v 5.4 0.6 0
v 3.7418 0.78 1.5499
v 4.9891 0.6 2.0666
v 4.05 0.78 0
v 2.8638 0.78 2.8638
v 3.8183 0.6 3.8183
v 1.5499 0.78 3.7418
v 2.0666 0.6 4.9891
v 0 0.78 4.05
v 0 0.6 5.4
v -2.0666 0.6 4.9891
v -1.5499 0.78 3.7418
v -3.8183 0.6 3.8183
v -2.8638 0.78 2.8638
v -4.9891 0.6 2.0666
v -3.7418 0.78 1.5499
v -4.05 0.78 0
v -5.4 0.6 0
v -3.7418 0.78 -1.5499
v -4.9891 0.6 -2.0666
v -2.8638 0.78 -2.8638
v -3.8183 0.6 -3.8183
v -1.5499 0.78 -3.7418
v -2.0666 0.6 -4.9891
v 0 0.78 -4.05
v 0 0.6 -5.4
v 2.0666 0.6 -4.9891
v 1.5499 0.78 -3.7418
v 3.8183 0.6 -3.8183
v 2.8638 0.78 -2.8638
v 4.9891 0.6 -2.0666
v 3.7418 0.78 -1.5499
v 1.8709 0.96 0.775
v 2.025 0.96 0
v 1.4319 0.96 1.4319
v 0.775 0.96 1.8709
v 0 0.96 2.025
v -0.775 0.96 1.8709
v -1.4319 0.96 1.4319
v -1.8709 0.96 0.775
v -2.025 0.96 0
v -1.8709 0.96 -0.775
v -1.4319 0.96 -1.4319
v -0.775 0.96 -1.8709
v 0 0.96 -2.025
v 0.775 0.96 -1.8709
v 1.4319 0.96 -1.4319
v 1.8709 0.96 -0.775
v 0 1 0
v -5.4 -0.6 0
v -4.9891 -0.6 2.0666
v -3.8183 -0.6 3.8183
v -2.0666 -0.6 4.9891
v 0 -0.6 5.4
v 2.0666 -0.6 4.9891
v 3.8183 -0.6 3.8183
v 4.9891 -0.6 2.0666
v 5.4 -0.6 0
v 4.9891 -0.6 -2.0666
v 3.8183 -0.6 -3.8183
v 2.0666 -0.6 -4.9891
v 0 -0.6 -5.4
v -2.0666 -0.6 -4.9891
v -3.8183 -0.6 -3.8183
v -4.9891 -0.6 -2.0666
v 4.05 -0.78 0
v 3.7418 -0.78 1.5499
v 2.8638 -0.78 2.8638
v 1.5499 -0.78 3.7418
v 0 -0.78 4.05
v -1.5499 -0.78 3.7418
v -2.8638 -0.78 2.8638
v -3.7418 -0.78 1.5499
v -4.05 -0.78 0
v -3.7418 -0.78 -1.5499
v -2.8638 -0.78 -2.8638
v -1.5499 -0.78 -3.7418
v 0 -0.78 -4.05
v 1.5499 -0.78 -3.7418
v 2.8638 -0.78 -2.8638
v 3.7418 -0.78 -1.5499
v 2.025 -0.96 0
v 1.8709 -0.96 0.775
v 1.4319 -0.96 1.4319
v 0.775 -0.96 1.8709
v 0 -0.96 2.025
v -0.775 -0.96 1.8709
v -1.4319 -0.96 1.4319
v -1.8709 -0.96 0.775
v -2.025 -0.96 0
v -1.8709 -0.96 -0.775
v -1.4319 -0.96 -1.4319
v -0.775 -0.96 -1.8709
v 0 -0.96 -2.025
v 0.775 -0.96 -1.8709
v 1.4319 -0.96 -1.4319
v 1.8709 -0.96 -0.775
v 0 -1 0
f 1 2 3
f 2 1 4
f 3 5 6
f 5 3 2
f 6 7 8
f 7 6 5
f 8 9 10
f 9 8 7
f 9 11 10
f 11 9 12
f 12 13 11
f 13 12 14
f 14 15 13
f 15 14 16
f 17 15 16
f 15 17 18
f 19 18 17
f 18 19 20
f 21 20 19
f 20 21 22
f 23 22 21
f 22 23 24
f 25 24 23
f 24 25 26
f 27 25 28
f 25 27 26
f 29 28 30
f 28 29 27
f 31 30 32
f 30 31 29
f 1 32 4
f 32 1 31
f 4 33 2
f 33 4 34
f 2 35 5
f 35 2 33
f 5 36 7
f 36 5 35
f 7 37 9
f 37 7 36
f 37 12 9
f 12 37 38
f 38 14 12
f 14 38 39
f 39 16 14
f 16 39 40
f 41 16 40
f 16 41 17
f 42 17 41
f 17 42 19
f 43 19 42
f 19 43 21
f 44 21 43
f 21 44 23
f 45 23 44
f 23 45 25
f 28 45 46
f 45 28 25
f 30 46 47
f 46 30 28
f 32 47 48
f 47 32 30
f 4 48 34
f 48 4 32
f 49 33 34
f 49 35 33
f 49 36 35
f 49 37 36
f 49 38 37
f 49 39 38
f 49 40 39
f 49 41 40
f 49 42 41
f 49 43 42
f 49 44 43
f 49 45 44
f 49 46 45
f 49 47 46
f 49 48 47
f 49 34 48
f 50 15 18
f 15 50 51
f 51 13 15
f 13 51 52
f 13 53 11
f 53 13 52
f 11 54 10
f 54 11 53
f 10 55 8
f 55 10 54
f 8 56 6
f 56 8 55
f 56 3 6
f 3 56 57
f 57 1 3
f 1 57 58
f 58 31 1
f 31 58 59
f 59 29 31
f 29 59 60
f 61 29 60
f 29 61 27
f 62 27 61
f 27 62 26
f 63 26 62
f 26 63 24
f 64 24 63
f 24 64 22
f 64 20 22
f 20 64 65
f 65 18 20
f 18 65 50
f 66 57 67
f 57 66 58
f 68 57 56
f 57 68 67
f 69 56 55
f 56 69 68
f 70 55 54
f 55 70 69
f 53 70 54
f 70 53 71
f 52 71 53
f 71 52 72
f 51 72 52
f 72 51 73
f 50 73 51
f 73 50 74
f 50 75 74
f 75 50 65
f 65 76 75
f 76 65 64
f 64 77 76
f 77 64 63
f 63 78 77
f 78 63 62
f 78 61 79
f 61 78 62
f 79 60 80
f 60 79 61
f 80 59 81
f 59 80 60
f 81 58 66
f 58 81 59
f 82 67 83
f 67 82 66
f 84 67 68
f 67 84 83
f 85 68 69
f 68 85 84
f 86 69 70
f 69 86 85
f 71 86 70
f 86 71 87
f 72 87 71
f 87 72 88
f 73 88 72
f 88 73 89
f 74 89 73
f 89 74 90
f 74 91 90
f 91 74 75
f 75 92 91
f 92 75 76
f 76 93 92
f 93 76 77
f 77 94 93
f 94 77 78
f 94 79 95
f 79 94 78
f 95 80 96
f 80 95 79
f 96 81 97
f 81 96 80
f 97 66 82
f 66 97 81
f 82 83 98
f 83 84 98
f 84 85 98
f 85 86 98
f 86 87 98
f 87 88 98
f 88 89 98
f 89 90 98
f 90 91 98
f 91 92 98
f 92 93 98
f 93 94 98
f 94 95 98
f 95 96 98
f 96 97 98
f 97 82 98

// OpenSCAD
// file: ../../p/4-4cyli.scad
use <../lib.scad>
function ldraw_lib__4_4cyli() = [
// 0 Cylinder 1.0
// 0 Name: 4-4cyli.dat
// 0 Author: James Jessiman
// 0 !LDRAW_ORG Primitive UPDATE 2005-01
// 0 !LICENSE Licensed under CC BY 2.0 and CC BY 4.0 : see CAreadme.txt
// 
// 0 BFC CERTIFY CCW
  [0,"BFC","CERTIFY"],
  [0,"BFC","CCW"],
// 
// 0 !HISTORY 1998-12-15 [PTadmin] Official Update 1998-10
// 0 !HISTORY 2002-03-23 [sbliss] Added BFC statement; merged headers from files in distributions LDraw 0.27 and Complete.
// 0 !HISTORY 2002-04-25 [PTadmin] Official Update 2002-02
// 0 !HISTORY 2004-12-14 [guyvivan] BFC CCW
// 0 !HISTORY 2005-12-28 [PTadmin] Official Update 2005-01
// 0 !HISTORY 2007-06-24 [PTadmin] Header formatted for Contributor Agreement
// 0 !HISTORY 2008-07-01 [PTadmin] Official Update 2008-01
// 
// 
// 4 16 1 1 0 0.9239 1 0.3827 0.9239 0 0.3827 1 0 0
  [4,16,1,1,0,0.9239,1,0.3827,0.9239,0,0.3827,1,0,0],
// 5 24 1 0 0 1 1 0 0.9239 0 0.3827 0.9239 0 -0.3827
  [5,24,1,0,0,1,1,0,0.9239,0,0.3827,0.9239,0,-0.3827],
// 4 16 0.9239 1 0.3827 0.7071 1 0.7071 0.7071 0 0.7071 0.9239 0 0.3827
  [4,16,0.9239,1,0.3827,0.7071,1,0.7071,0.7071,0,0.7071,0.9239,0,0.3827],
// 5 24 0.9239 0 0.3827 0.9239 1 0.3827 0.7071 0 0.7071 1 0 0
  [5,24,0.9239,0,0.3827,0.9239,1,0.3827,0.7071,0,0.7071,1,0,0],
// 4 16 0.7071 1 0.7071 0.3827 1 0.9239 0.3827 0 0.9239 0.7071 0 0.7071
  [4,16,0.7071,1,0.7071,0.3827,1,0.9239,0.3827,0,0.9239,0.7071,0,0.7071],
// 5 24 0.7071 0 0.7071 0.7071 1 0.7071 0.3827 0 0.9239 0.9239 0 0.3827
  [5,24,0.7071,0,0.7071,0.7071,1,0.7071,0.3827,0,0.9239,0.9239,0,0.3827],
// 4 16 0.3827 1 0.9239 0 1 1 0 0 1 0.3827 0 0.9239
  [4,16,0.3827,1,0.9239,0,1,1,0,0,1,0.3827,0,0.9239],
// 5 24 0.3827 0 0.9239 0.3827 1 0.9239 0 0 1 0.7071 0 0.7071
  [5,24,0.3827,0,0.9239,0.3827,1,0.9239,0,0,1,0.7071,0,0.7071],
// 4 16 0 1 1 -0.3827 1 0.9239 -0.3827 0 0.9239 0 0 1
  [4,16,0,1,1,-0.3827,1,0.9239,-0.3827,0,0.9239,0,0,1],
// 5 24 0 0 1 0 1 1 -0.3827 0 0.9239 0.3827 0 0.9239
  [5,24,0,0,1,0,1,1,-0.3827,0,0.9239,0.3827,0,0.9239],
// 4 16 -0.3827 1 0.9239 -0.7071 1 0.7071 -0.7071 0 0.7071 -0.3827 0 0.9239
  [4,16,-0.3827,1,0.9239,-0.7071,1,0.7071,-0.7071,0,0.7071,-0.3827,0,0.9239],
// 5 24 -0.3827 0 0.9239 -0.3827 1 0.9239 -0.7071 0 0.7071 0 0 1
  [5,24,-0.3827,0,0.9239,-0.3827,1,0.9239,-0.7071,0,0.7071,0,0,1],
// 4 16 -0.7071 1 0.7071 -0.9239 1 0.3827 -0.9239 0 0.3827 -0.7071 0 0.7071
  [4,16,-0.7071,1,0.7071,-0.9239,1,0.3827,-0.9239,0,0.3827,-0.7071,0,0.7071],
// 5 24 -0.7071 0 0.7071 -0.7071 1 0.7071 -0.9239 0 0.3827 -0.3827 0 0.9239
  [5,24,-0.7071,0,0.7071,-0.7071,1,0.7071,-0.9239,0,0.3827,-0.3827,0,0.9239],
// 4 16 -0.9239 1 0.3827 -1 1 0 -1 0 0 -0.9239 0 0.3827
  [4,16,-0.9239,1,0.3827,-1,1,0,-1,0,0,-0.9239,0,0.3827],
// 5 24 -0.9239 0 0.3827 -0.9239 1 0.3827 -1 0 0 -0.7071 0 0.7071
  [5,24,-0.9239,0,0.3827,-0.9239,1,0.3827,-1,0,0,-0.7071,0,0.7071],
// 4 16 -1 1 0 -0.9239 1 -0.3827 -0.9239 0 -0.3827 -1 0 0
  [4,16,-1,1,0,-0.9239,1,-0.3827,-0.9239,0,-0.3827,-1,0,0],
// 5 24 -1 0 0 -1 1 0 -0.9239 0 -0.3827 -0.9239 0 0.3827
  [5,24,-1,0,0,-1,1,0,-0.9239,0,-0.3827,-0.9239,0,0.3827],
// 4 16 -0.9239 1 -0.3827 -0.7071 1 -0.7071 -0.7071 0 -0.7071 -0.9239 0 -0.3827
  [4,16,-0.9239,1,-0.3827,-0.7071,1,-0.7071,-0.7071,0,-0.7071,-0.9239,0,-0.3827],
// 5 24 -0.9239 0 -0.3827 -0.9239 1 -0.3827 -0.7071 0 -0.7071 -1 0 0
  [5,24,-0.9239,0,-0.3827,-0.9239,1,-0.3827,-0.7071,0,-0.7071,-1,0,0],
// 4 16 -0.7071 1 -0.7071 -0.3827 1 -0.9239 -0.3827 0 -0.9239 -0.7071 0 -0.7071
  [4,16,-0.7071,1,-0.7071,-0.3827,1,-0.9239,-0.3827,0,-0.9239,-0.7071,0,-0.7071],
// 5 24 -0.7071 0 -0.7071 -0.7071 1 -0.7071 -0.3827 0 -0.9239 -0.9239 0 -0.3827
  [5,24,-0.7071,0,-0.7071,-0.7071,1,-0.7071,-0.3827,0,-0.9239,-0.9239,0,-0.3827],
// 4 16 -0.3827 1 -0.9239 0 1 -1 0 0 -1 -0.3827 0 -0.9239
  [4,16,-0.3827,1,-0.9239,0,1,-1,0,0,-1,-0.3827,0,-0.9239],
// 5 24 -0.3827 0 -0.9239 -0.3827 1 -0.9239 0 0 -1 -0.7071 0 -0.7071
  [5,24,-0.3827,0,-0.9239,-0.3827,1,-0.9239,0,0,-1,-0.7071,0,-0.7071],
// 4 16 0 1 -1 0.3827 1 -0.9239 0.3827 0 -0.9239 0 0 -1
  [4,16,0,1,-1,0.3827,1,-0.9239,0.3827,0,-0.9239,0,0,-1],
// 5 24 0 0 -1 0 1 -1 0.3827 0 -0.9239 -0.3827 0 -0.9239
  [5,24,0,0,-1,0,1,-1,0.3827,0,-0.9239,-0.3827,0,-0.9239],
// 4 16 0.3827 1 -0.9239 0.7071 1 -0.7071 0.7071 0 -0.7071 0.3827 0 -0.9239
  [4,16,0.3827,1,-0.9239,0.7071,1,-0.7071,0.7071,0,-0.7071,0.3827,0,-0.9239],
// 5 24 0.3827 0 -0.9239 0.3827 1 -0.9239 0.7071 0 -0.7071 0 0 -1
  [5,24,0.3827,0,-0.9239,0.3827,1,-0.9239,0.7071,0,-0.7071,0,0,-1],
// 4 16 0.7071 1 -0.7071 0.9239 1 -0.3827 0.9239 0 -0.3827 0.7071 0 -0.7071
  [4,16,0.7071,1,-0.7071,0.9239,1,-0.3827,0.9239,0,-0.3827,0.7071,0,-0.7071],
// 5 24 0.7071 0 -0.7071 0.7071 1 -0.7071 0.9239 0 -0.3827 0.3827 0 -0.9239
  [5,24,0.7071,0,-0.7071,0.7071,1,-0.7071,0.9239,0,-0.3827,0.3827,0,-0.9239],
// 4 16 0.9239 1 -0.3827 1 1 0 1 0 0 0.9239 0 -0.3827
  [4,16,0.9239,1,-0.3827,1,1,0,1,0,0,0.9239,0,-0.3827],
// 5 24 0.9239 0 -0.3827 0.9239 1 -0.3827 1 0 0 0.7071 0 -0.7071
  [5,24,0.9239,0,-0.3827,0.9239,1,-0.3827,1,0,0,0.7071,0,-0.7071],
// 0
];
makepoly(ldraw_lib__4_4cyli(), line=0.2);
// file: ../../p/4-4edge.scad
use <../lib.scad>
function ldraw_lib__4_4edge() = [
// 0 Circle 1.0
// 0 Name: 4-4edge.dat
// 0 Author: James Jessiman
// 0 !LDRAW_ORG Primitive UPDATE 2017-01
// 0 !LICENSE Licensed under CC BY 2.0 and CC BY 4.0 : see CAreadme.txt
// 
// 0 BFC CERTIFY CCW
  [0,"BFC","CERTIFY"],
  [0,"BFC","CCW"],
// 
// 0 !HISTORY 1998-12-15 [PTadmin] Official Update 1998-10
// 0 !HISTORY 2005-12-28 [PTadmin] Official Update 2005-01
// 0 !HISTORY 2007-06-24 [PTadmin] Header formatted for Contributor Agreement
// 0 !HISTORY 2008-07-01 [PTadmin] Official Update 2008-01
// 0 !HISTORY 2017-01-15 [Steffen] BFCed
// 0 !HISTORY 2017-12-30 [PTadmin] Official Update 2017-01
// 
// 
// 2 24 1 0 0 0.9239 0 0.3827
  [2,24,1,0,0,0.9239,0,0.3827],
// 2 24 0.9239 0 0.3827 0.7071 0 0.7071
  [2,24,0.9239,0,0.3827,0.7071,0,0.7071],
// 2 24 0.7071 0 0.7071 0.3827 0 0.9239
  [2,24,0.7071,0,0.7071,0.3827,0,0.9239],
// 2 24 0.3827 0 0.9239 0 0 1
  [2,24,0.3827,0,0.9239,0,0,1],
// 2 24 0 0 1 -0.3827 0 0.9239
  [2,24,0,0,1,-0.3827,0,0.9239],
// 2 24 -0.3827 0 0.9239 -0.7071 0 0.7071
  [2,24,-0.3827,0,0.9239,-0.7071,0,0.7071],
// 2 24 -0.7071 0 0.7071 -0.9239 0 0.3827
  [2,24,-0.7071,0,0.7071,-0.9239,0,0.3827],
// 2 24 -0.9239 0 0.3827 -1 0 -0
  [2,24,-0.9239,0,0.3827,-1,0,-0],
// 2 24 -1 0 -0 -0.9239 0 -0.3827
  [2,24,-1,0,-0,-0.9239,0,-0.3827],
// 2 24 -0.9239 0 -0.3827 -0.7071 0 -0.7071
  [2,24,-0.9239,0,-0.3827,-0.7071,0,-0.7071],
// 2 24 -0.7071 0 -0.7071 -0.3827 0 -0.9239
  [2,24,-0.7071,0,-0.7071,-0.3827,0,-0.9239],
// 2 24 -0.3827 0 -0.9239 0 0 -1
  [2,24,-0.3827,0,-0.9239,0,0,-1],
// 2 24 0 0 -1 0.3827 0 -0.9239
  [2,24,0,0,-1,0.3827,0,-0.9239],
// 2 24 0.3827 0 -0.9239 0.7071 0 -0.7071
  [2,24,0.3827,0,-0.9239,0.7071,0,-0.7071],
// 2 24 0.7071 0 -0.7071 0.9239 0 -0.3827
  [2,24,0.7071,0,-0.7071,0.9239,0,-0.3827],
// 2 24 0.9239 0 -0.3827 1 0 0
  [2,24,0.9239,0,-0.3827,1,0,0],
];
makepoly(ldraw_lib__4_4edge(), line=0.2);
// file: ../../p/4-4con3.scad
use <../lib.scad>
function ldraw_lib__4_4con3() = [
// 0 Cone  3 x 1.0
// 0 Name: 4-4con3.dat
// 0 Author: Niels Karsdorp [nielsk]
// 0 !LDRAW_ORG Primitive UPDATE 2003-02
// 0 !LICENSE Licensed under CC BY 2.0 and CC BY 4.0 : see CAreadme.txt
// 
// 0 BFC CERTIFY CCW
  [0,"BFC","CERTIFY"],
  [0,"BFC","CCW"],
// 
// 0 !HISTORY 2003-08-01 [PTadmin] Official Update 2003-02
// 0 !HISTORY 2007-06-24 [PTadmin] Header formatted for Contributor Agreement
// 0 !HISTORY 2008-07-01 [PTadmin] Official Update 2008-01
// 
// 
// 5 24 3 1 0 4 0 0 2.7717 1 1.1481 2.7717 1 -1.1481
  [5,24,3,1,0,4,0,0,2.7717,1,1.1481,2.7717,1,-1.1481],
// 5 24 2.7717 1 1.1481 3.6956 0 1.5308 2.1213 1 2.1213 3 1 0
  [5,24,2.7717,1,1.1481,3.6956,0,1.5308,2.1213,1,2.1213,3,1,0],
// 5 24 2.1213 1 2.1213 2.8284 0 2.8284 1.1481 1 2.7717 2.7717 1 1.1481
  [5,24,2.1213,1,2.1213,2.8284,0,2.8284,1.1481,1,2.7717,2.7717,1,1.1481],
// 5 24 1.1481 1 2.7717 1.5308 0 3.6956 0 1 3 2.1213 1 2.1213
  [5,24,1.1481,1,2.7717,1.5308,0,3.6956,0,1,3,2.1213,1,2.1213],
// 5 24 0 1 3 0 0 4 -1.1481 1 2.7717 1.1481 1 2.7717
  [5,24,0,1,3,0,0,4,-1.1481,1,2.7717,1.1481,1,2.7717],
// 5 24 -1.1481 1 2.7717 -1.5308 0 3.6956 -2.1213 1 2.1213 0 1 3
  [5,24,-1.1481,1,2.7717,-1.5308,0,3.6956,-2.1213,1,2.1213,0,1,3],
// 5 24 -2.1213 1 2.1213 -2.8284 0 2.8284 -2.7717 1 1.1481 -1.1481 1 2.7717
  [5,24,-2.1213,1,2.1213,-2.8284,0,2.8284,-2.7717,1,1.1481,-1.1481,1,2.7717],
// 5 24 -2.7717 1 1.1481 -3.6956 0 1.5308 -3 1 0 -2.1213 1 2.1213
  [5,24,-2.7717,1,1.1481,-3.6956,0,1.5308,-3,1,0,-2.1213,1,2.1213],
// 5 24 -3 1 0 -4 0 0 -2.7717 1 -1.1481 -2.7717 1 1.1481
  [5,24,-3,1,0,-4,0,0,-2.7717,1,-1.1481,-2.7717,1,1.1481],
// 5 24 -2.7717 1 -1.1481 -3.6956 0 -1.5308 -2.1213 1 -2.1213 -3 1 0
  [5,24,-2.7717,1,-1.1481,-3.6956,0,-1.5308,-2.1213,1,-2.1213,-3,1,0],
// 5 24 -2.1213 1 -2.1213 -2.8284 0 -2.8284 -1.1481 1 -2.7717 -2.7717 1 -1.1481
  [5,24,-2.1213,1,-2.1213,-2.8284,0,-2.8284,-1.1481,1,-2.7717,-2.7717,1,-1.1481],
// 5 24 -1.1481 1 -2.7717 -1.5308 0 -3.6956 0 1 -3 -2.1213 1 -2.1213
  [5,24,-1.1481,1,-2.7717,-1.5308,0,-3.6956,0,1,-3,-2.1213,1,-2.1213],
// 5 24 0 1 -3 0 0 -4 1.1481 1 -2.7717 -1.1481 1 -2.7717
  [5,24,0,1,-3,0,0,-4,1.1481,1,-2.7717,-1.1481,1,-2.7717],
// 5 24 1.1481 1 -2.7717 1.5308 0 -3.6956 2.1213 1 -2.1213 0 1 -3
  [5,24,1.1481,1,-2.7717,1.5308,0,-3.6956,2.1213,1,-2.1213,0,1,-3],
// 5 24 2.1213 1 -2.1213 2.8284 0 -2.8284 2.7717 1 -1.1481 1.1481 1 -2.7717
  [5,24,2.1213,1,-2.1213,2.8284,0,-2.8284,2.7717,1,-1.1481,1.1481,1,-2.7717],
// 5 24 2.7717 1 -1.1481 3.6956 0 -1.5308 3 1 0 2.1213 1 -2.1213
  [5,24,2.7717,1,-1.1481,3.6956,0,-1.5308,3,1,0,2.1213,1,-2.1213],
// 
// 4 16 3 1 0 2.7717 1 1.1481 3.6956 0 1.5308 4 0 0
  [4,16,3,1,0,2.7717,1,1.1481,3.6956,0,1.5308,4,0,0],
// 4 16 2.7717 1 1.1481 2.1213 1 2.1213 2.8284 0 2.8284 3.6956 0 1.5308
  [4,16,2.7717,1,1.1481,2.1213,1,2.1213,2.8284,0,2.8284,3.6956,0,1.5308],
// 4 16 2.1213 1 2.1213 1.1481 1 2.7717 1.5308 0 3.6956 2.8284 0 2.8284
  [4,16,2.1213,1,2.1213,1.1481,1,2.7717,1.5308,0,3.6956,2.8284,0,2.8284],
// 4 16 1.1481 1 2.7717 0 1 3 0 0 4 1.5308 0 3.6956
  [4,16,1.1481,1,2.7717,0,1,3,0,0,4,1.5308,0,3.6956],
// 4 16 0 1 3 -1.1481 1 2.7717 -1.5308 0 3.6956 0 0 4
  [4,16,0,1,3,-1.1481,1,2.7717,-1.5308,0,3.6956,0,0,4],
// 4 16 -1.1481 1 2.7717 -2.1213 1 2.1213 -2.8284 0 2.8284 -1.5308 0 3.6956
  [4,16,-1.1481,1,2.7717,-2.1213,1,2.1213,-2.8284,0,2.8284,-1.5308,0,3.6956],
// 4 16 -2.1213 1 2.1213 -2.7717 1 1.1481 -3.6956 0 1.5308 -2.8284 0 2.8284
  [4,16,-2.1213,1,2.1213,-2.7717,1,1.1481,-3.6956,0,1.5308,-2.8284,0,2.8284],
// 4 16 -2.7717 1 1.1481 -3 1 0 -4 0 0 -3.6956 0 1.5308
  [4,16,-2.7717,1,1.1481,-3,1,0,-4,0,0,-3.6956,0,1.5308],
// 4 16 -3 1 0 -2.7717 1 -1.1481 -3.6956 0 -1.5308 -4 0 0
  [4,16,-3,1,0,-2.7717,1,-1.1481,-3.6956,0,-1.5308,-4,0,0],
// 4 16 -2.7717 1 -1.1481 -2.1213 1 -2.1213 -2.8284 0 -2.8284 -3.6956 0 -1.5308
  [4,16,-2.7717,1,-1.1481,-2.1213,1,-2.1213,-2.8284,0,-2.8284,-3.6956,0,-1.5308],
// 4 16 -2.1213 1 -2.1213 -1.1481 1 -2.7717 -1.5308 0 -3.6956 -2.8284 0 -2.8284
  [4,16,-2.1213,1,-2.1213,-1.1481,1,-2.7717,-1.5308,0,-3.6956,-2.8284,0,-2.8284],
// 4 16 -1.1481 1 -2.7717 0 1 -3 0 0 -4 -1.5308 0 -3.6956
  [4,16,-1.1481,1,-2.7717,0,1,-3,0,0,-4,-1.5308,0,-3.6956],
// 4 16 0 1 -3 1.1481 1 -2.7717 1.5308 0 -3.6956 0 0 -4
  [4,16,0,1,-3,1.1481,1,-2.7717,1.5308,0,-3.6956,0,0,-4],
// 4 16 1.1481 1 -2.7717 2.1213 1 -2.1213 2.8284 0 -2.8284 1.5308 0 -3.6956
  [4,16,1.1481,1,-2.7717,2.1213,1,-2.1213,2.8284,0,-2.8284,1.5308,0,-3.6956],
// 4 16 2.1213 1 -2.1213 2.7717 1 -1.1481 3.6956 0 -1.5308 2.8284 0 -2.8284
  [4,16,2.1213,1,-2.1213,2.7717,1,-1.1481,3.6956,0,-1.5308,2.8284,0,-2.8284],
// 4 16 2.7717 1 -1.1481 3 1 0 4 0 0 3.6956 0 -1.5308
  [4,16,2.7717,1,-1.1481,3,1,0,4,0,0,3.6956,0,-1.5308],
// 
// 0
// 
];
makepoly(ldraw_lib__4_4con3(), line=0.2);
// file: ../../p/4-4con1.scad
use <../lib.scad>
function ldraw_lib__4_4con1() = [
// 0 Cone  1 x 1.0
// 0 Name: 4-4con1.dat
// 0 Author: Steve Bliss [sbliss]
// 0 !LDRAW_ORG Primitive UPDATE 2012-01
// 0 !LICENSE Licensed under CC BY 2.0 and CC BY 4.0 : see CAreadme.txt
// 
// 0 BFC CERTIFY CCW
  [0,"BFC","CERTIFY"],
  [0,"BFC","CCW"],
// 
// 0 !HISTORY 1999-08-19 [sbliss] Renamed 4-4con12.dat to 4-4con1.dat, Moved all conditional lines before quads
// 0 !HISTORY 2000-05-07 [PTadmin] Official Update 2000-01
// 0 !HISTORY 2002-12-11 [cwdee] Standardised title and made BFC compliant
// 0 !HISTORY 2003-08-01 [PTadmin] Official Update 2003-02
// 0 !HISTORY 2007-06-24 [PTadmin] Header formatted for Contributor Agreement
// 0 !HISTORY 2008-07-01 [PTadmin] Official Update 2008-01
// 0 !HISTORY 2012-02-16 [Philo] Changed to CCW, reordered
// 0 !HISTORY 2012-03-30 [PTadmin] Official Update 2012-01
// 
// 
// 5 24 1 1 0 2 0 0 0.9239 1 -0.3827 0.9239 1 0.3827
  [5,24,1,1,0,2,0,0,0.9239,1,-0.3827,0.9239,1,0.3827],
// 5 24 0.9239 1 0.3827 1.8478 0 0.7654 1 1 0 0.7071 1 0.7071
  [5,24,0.9239,1,0.3827,1.8478,0,0.7654,1,1,0,0.7071,1,0.7071],
// 5 24 0.7071 1 0.7071 1.4142 0 1.4142 0.9239 1 0.3827 0.3827 1 0.9239
  [5,24,0.7071,1,0.7071,1.4142,0,1.4142,0.9239,1,0.3827,0.3827,1,0.9239],
// 5 24 0.3827 1 0.9239 0.7654 0 1.8478 0.7071 1 0.7071 0 1 1
  [5,24,0.3827,1,0.9239,0.7654,0,1.8478,0.7071,1,0.7071,0,1,1],
// 5 24 0 1 1 0 0 2 0.3827 1 0.9239 -0.3827 1 0.9239
  [5,24,0,1,1,0,0,2,0.3827,1,0.9239,-0.3827,1,0.9239],
// 5 24 -0.3827 1 0.9239 -0.7654 0 1.8478 0 1 1 -0.7071 1 0.7071
  [5,24,-0.3827,1,0.9239,-0.7654,0,1.8478,0,1,1,-0.7071,1,0.7071],
// 5 24 -0.7071 1 0.7071 -1.4142 0 1.4142 -0.3827 1 0.9239 -0.9239 1 0.3827
  [5,24,-0.7071,1,0.7071,-1.4142,0,1.4142,-0.3827,1,0.9239,-0.9239,1,0.3827],
// 5 24 -0.9239 1 0.3827 -1.8478 0 0.7654 -0.7071 1 0.7071 -1 1 0
  [5,24,-0.9239,1,0.3827,-1.8478,0,0.7654,-0.7071,1,0.7071,-1,1,0],
// 5 24 -1 1 0 -2 0 0 -0.9239 1 0.3827 -0.9239 1 -0.3827
  [5,24,-1,1,0,-2,0,0,-0.9239,1,0.3827,-0.9239,1,-0.3827],
// 5 24 -0.9239 1 -0.3827 -1.8478 0 -0.7654 -1 1 0 -0.7071 1 -0.7071
  [5,24,-0.9239,1,-0.3827,-1.8478,0,-0.7654,-1,1,0,-0.7071,1,-0.7071],
// 5 24 -0.7071 1 -0.7071 -1.4142 0 -1.4142 -0.9239 1 -0.3827 -0.3827 1 -0.9239
  [5,24,-0.7071,1,-0.7071,-1.4142,0,-1.4142,-0.9239,1,-0.3827,-0.3827,1,-0.9239],
// 5 24 -0.3827 1 -0.9239 -0.7654 0 -1.8478 -0.7071 1 -0.7071 0 1 -1
  [5,24,-0.3827,1,-0.9239,-0.7654,0,-1.8478,-0.7071,1,-0.7071,0,1,-1],
// 5 24 0 1 -1 0 0 -2 -0.3827 1 -0.9239 0.3827 1 -0.9239
  [5,24,0,1,-1,0,0,-2,-0.3827,1,-0.9239,0.3827,1,-0.9239],
// 5 24 0.3827 1 -0.9239 0.7654 0 -1.8478 0 1 -1 0.7071 1 -0.7071
  [5,24,0.3827,1,-0.9239,0.7654,0,-1.8478,0,1,-1,0.7071,1,-0.7071],
// 5 24 0.7071 1 -0.7071 1.4142 0 -1.4142 0.3827 1 -0.9239 0.9239 1 -0.3827
  [5,24,0.7071,1,-0.7071,1.4142,0,-1.4142,0.3827,1,-0.9239,0.9239,1,-0.3827],
// 5 24 0.9239 1 -0.3827 1.8478 0 -0.7654 0.7071 1 -0.7071 1 1 0
  [5,24,0.9239,1,-0.3827,1.8478,0,-0.7654,0.7071,1,-0.7071,1,1,0],
// 
// 4 16 2 0 0 1 1 0 0.9239 1 0.3827 1.8478 0 0.7654
  [4,16,2,0,0,1,1,0,0.9239,1,0.3827,1.8478,0,0.7654],
// 4 16 1.8478 0 0.7654 0.9239 1 0.3827 0.7071 1 0.7071 1.4142 0 1.4142
  [4,16,1.8478,0,0.7654,0.9239,1,0.3827,0.7071,1,0.7071,1.4142,0,1.4142],
// 4 16 1.4142 0 1.4142 0.7071 1 0.7071 0.3827 1 0.9239 0.7654 0 1.8478
  [4,16,1.4142,0,1.4142,0.7071,1,0.7071,0.3827,1,0.9239,0.7654,0,1.8478],
// 4 16 0.7654 0 1.8478 0.3827 1 0.9239 0 1 1 0 0 2
  [4,16,0.7654,0,1.8478,0.3827,1,0.9239,0,1,1,0,0,2],
// 4 16 0 0 2 0 1 1 -0.3827 1 0.9239 -0.7654 0 1.8478
  [4,16,0,0,2,0,1,1,-0.3827,1,0.9239,-0.7654,0,1.8478],
// 4 16 -0.7654 0 1.8478 -0.3827 1 0.9239 -0.7071 1 0.7071 -1.4142 0 1.4142
  [4,16,-0.7654,0,1.8478,-0.3827,1,0.9239,-0.7071,1,0.7071,-1.4142,0,1.4142],
// 4 16 -1.4142 0 1.4142 -0.7071 1 0.7071 -0.9239 1 0.3827 -1.8478 0 0.7654
  [4,16,-1.4142,0,1.4142,-0.7071,1,0.7071,-0.9239,1,0.3827,-1.8478,0,0.7654],
// 4 16 -1.8478 0 0.7654 -0.9239 1 0.3827 -1 1 0 -2 0 0
  [4,16,-1.8478,0,0.7654,-0.9239,1,0.3827,-1,1,0,-2,0,0],
// 4 16 -2 0 0 -1 1 0 -0.9239 1 -0.3827 -1.8478 0 -0.7654
  [4,16,-2,0,0,-1,1,0,-0.9239,1,-0.3827,-1.8478,0,-0.7654],
// 4 16 -1.8478 0 -0.7654 -0.9239 1 -0.3827 -0.7071 1 -0.7071 -1.4142 0 -1.4142
  [4,16,-1.8478,0,-0.7654,-0.9239,1,-0.3827,-0.7071,1,-0.7071,-1.4142,0,-1.4142],
// 4 16 -1.4142 0 -1.4142 -0.7071 1 -0.7071 -0.3827 1 -0.9239 -0.7654 0 -1.8478
  [4,16,-1.4142,0,-1.4142,-0.7071,1,-0.7071,-0.3827,1,-0.9239,-0.7654,0,-1.8478],
// 4 16 -0.7654 0 -1.8478 -0.3827 1 -0.9239 0 1 -1 0 0 -2
  [4,16,-0.7654,0,-1.8478,-0.3827,1,-0.9239,0,1,-1,0,0,-2],
// 4 16 0 0 -2 0 1 -1 0.3827 1 -0.9239 0.7654 0 -1.8478
  [4,16,0,0,-2,0,1,-1,0.3827,1,-0.9239,0.7654,0,-1.8478],
// 4 16 0.7654 0 -1.8478 0.3827 1 -0.9239 0.7071 1 -0.7071 1.4142 0 -1.4142
  [4,16,0.7654,0,-1.8478,0.3827,1,-0.9239,0.7071,1,-0.7071,1.4142,0,-1.4142],
// 4 16 1.4142 0 -1.4142 0.7071 1 -0.7071 0.9239 1 -0.3827 1.8478 0 -0.7654
  [4,16,1.4142,0,-1.4142,0.7071,1,-0.7071,0.9239,1,-0.3827,1.8478,0,-0.7654],
// 4 16 1.8478 0 -0.7654 0.9239 1 -0.3827 1 1 0 2 0 0
  [4,16,1.8478,0,-0.7654,0.9239,1,-0.3827,1,1,0,2,0,0],
];
makepoly(ldraw_lib__4_4con1(), line=0.2);
// file: ../../p/4-4con0.scad
use <../lib.scad>
function ldraw_lib__4_4con0() = [
// 0 Cone  0 x 1.0
// 0 Name: 4-4con0.dat
// 0 Author: William Howard [WilliamH]
// 0 !LDRAW_ORG Primitive UPDATE 2009-03
// 0 !LICENSE Licensed under CC BY 2.0 and CC BY 4.0 : see CAreadme.txt
// 
// 0 BFC CERTIFY CCW
  [0,"BFC","CERTIFY"],
  [0,"BFC","CCW"],
// 
// 0 !HISTORY 2009-12-29 [PTadmin] Official Update 2009-03
// 
// 
// 3 16 0 1 0 0.9239 0 0.3827 1 0 0
  [3,16,0,1,0,0.9239,0,0.3827,1,0,0],
// 3 16 0 1 0 0.7071 0 0.7071 0.9239 0 0.3827
  [3,16,0,1,0,0.7071,0,0.7071,0.9239,0,0.3827],
// 3 16 0 1 0 0.3827 0 0.9239 0.7071 0 0.7071
  [3,16,0,1,0,0.3827,0,0.9239,0.7071,0,0.7071],
// 3 16 0 1 0 0 0 1 0.3827 0 0.9239
  [3,16,0,1,0,0,0,1,0.3827,0,0.9239],
// 3 16 0 1 0 -0.3827 0 0.9239 0 0 1
  [3,16,0,1,0,-0.3827,0,0.9239,0,0,1],
// 3 16 0 1 0 -0.7071 0 0.7071 -0.3827 0 0.9239
  [3,16,0,1,0,-0.7071,0,0.7071,-0.3827,0,0.9239],
// 3 16 0 1 0 -0.9239 0 0.3827 -0.7071 0 0.7071
  [3,16,0,1,0,-0.9239,0,0.3827,-0.7071,0,0.7071],
// 3 16 0 1 0 -1 0 0 -0.9239 0 0.3827
  [3,16,0,1,0,-1,0,0,-0.9239,0,0.3827],
// 3 16 0 1 0 -0.9239 0 -0.3827 -1 0 0
  [3,16,0,1,0,-0.9239,0,-0.3827,-1,0,0],
// 3 16 0 1 0 -0.7071 0 -0.7071 -0.9239 0 -0.3827
  [3,16,0,1,0,-0.7071,0,-0.7071,-0.9239,0,-0.3827],
// 3 16 0 1 0 -0.3827 0 -0.9239 -0.7071 0 -0.7071
  [3,16,0,1,0,-0.3827,0,-0.9239,-0.7071,0,-0.7071],
// 3 16 0 1 0 0 0 -1 -0.3827 0 -0.9239
  [3,16,0,1,0,0,0,-1,-0.3827,0,-0.9239],
// 3 16 0 1 0 0.3827 0 -0.9239 0 0 -1
  [3,16,0,1,0,0.3827,0,-0.9239,0,0,-1],
// 3 16 0 1 0 0.7071 0 -0.7071 0.3827 0 -0.9239
  [3,16,0,1,0,0.7071,0,-0.7071,0.3827,0,-0.9239],
// 3 16 0 1 0 0.9239 0 -0.3827 0.7071 0 -0.7071
  [3,16,0,1,0,0.9239,0,-0.3827,0.7071,0,-0.7071],
// 3 16 0 1 0 1 0 0 0.9239 0 -0.3827
  [3,16,0,1,0,1,0,0,0.9239,0,-0.3827],
// 
// 0 conditional lines
// 5 24 0 1 0 1 0 0 0.9239 0 -0.3827 0.9239 0 0.3827
  [5,24,0,1,0,1,0,0,0.9239,0,-0.3827,0.9239,0,0.3827],
// 5 24 0 1 0 0.9239 0 0.3827 1 0 0 0.7071 0 0.7071
  [5,24,0,1,0,0.9239,0,0.3827,1,0,0,0.7071,0,0.7071],
// 5 24 0 1 0 0.7071 0 0.7071 0.9239 0 0.3827 0.3827 0 0.9239
  [5,24,0,1,0,0.7071,0,0.7071,0.9239,0,0.3827,0.3827,0,0.9239],
// 5 24 0 1 0 0.3827 0 0.9239 0.7071 0 0.7071 0 0 1
  [5,24,0,1,0,0.3827,0,0.9239,0.7071,0,0.7071,0,0,1],
// 5 24 0 1 0 0 0 1 0.3827 0 0.9239 -0.3827 0 0.9239
  [5,24,0,1,0,0,0,1,0.3827,0,0.9239,-0.3827,0,0.9239],
// 5 24 0 1 0 -0.3827 0 0.9239 0 0 1 -0.7071 0 0.7071
  [5,24,0,1,0,-0.3827,0,0.9239,0,0,1,-0.7071,0,0.7071],
// 5 24 0 1 0 -0.7071 0 0.7071 -0.3827 0 0.9239 -0.9239 0 0.3827
  [5,24,0,1,0,-0.7071,0,0.7071,-0.3827,0,0.9239,-0.9239,0,0.3827],
// 5 24 0 1 0 -0.9239 0 0.3827 -0.7071 0 0.7071 -1 0 0
  [5,24,0,1,0,-0.9239,0,0.3827,-0.7071,0,0.7071,-1,0,0],
// 5 24 0 1 0 -1 0 0 -0.9239 0 0.3827 -0.9239 0 -0.3827
  [5,24,0,1,0,-1,0,0,-0.9239,0,0.3827,-0.9239,0,-0.3827],
// 5 24 0 1 0 -0.9239 0 -0.3827 -1 0 0 -0.7071 0 -0.7071
  [5,24,0,1,0,-0.9239,0,-0.3827,-1,0,0,-0.7071,0,-0.7071],
// 5 24 0 1 0 -0.7071 0 -0.7071 -0.9239 0 -0.3827 -0.3827 0 -0.9239
  [5,24,0,1,0,-0.7071,0,-0.7071,-0.9239,0,-0.3827,-0.3827,0,-0.9239],
// 5 24 0 1 0 -0.3827 0 -0.9239 -0.7071 0 -0.7071 0 0 -1
  [5,24,0,1,0,-0.3827,0,-0.9239,-0.7071,0,-0.7071,0,0,-1],
// 5 24 0 1 0 0 0 -1 -0.3827 0 -0.9239 0.3827 0 -0.9239
  [5,24,0,1,0,0,0,-1,-0.3827,0,-0.9239,0.3827,0,-0.9239],
// 5 24 0 1 0 0.3827 0 -0.9239 0 0 -1 0.7071 0 -0.7071
  [5,24,0,1,0,0.3827,0,-0.9239,0,0,-1,0.7071,0,-0.7071],
// 5 24 0 1 0 0.7071 0 -0.7071 0.3827 0 -0.9239 0.9239 0 -0.3827
  [5,24,0,1,0,0.7071,0,-0.7071,0.3827,0,-0.9239,0.9239,0,-0.3827],
// 5 24 0 1 0 0.9239 0 -0.3827 0.7071 0 -0.7071 1 0 0
  [5,24,0,1,0,0.9239,0,-0.3827,0.7071,0,-0.7071,1,0,0],
// 
// 0 end of file
];
makepoly(ldraw_lib__4_4con0(), line=0.2);
// file: 10830s03.scad
use <../../lib.scad>
use <../../p/4-4cyli.scad>
use <../../p/bump5000.scad>
function ldraw_lib__s__10830s03() = [
// 0 ~Lens for Minifig Tool Magnifying Glass with Thick Frame without Front Face
// 0 Name: s\10830s03.dat
// 0 Author: Gerald Lasser [GeraldLasser]
// 0 !LDRAW_ORG Subpart UPDATE 2020-01
// 0 !LICENSE Licensed under CC BY 2.0 and CC BY 4.0 : see CAreadme.txt
// 
// 0 BFC CERTIFY CCW
  [0,"BFC","CERTIFY"],
  [0,"BFC","CCW"],
// 
// 0 !HISTORY 2020-06-28 [PTadmin] Official Update 2020-01
// 
// 
// 1 16 0 0 1.5 13.5 0 0 0 0 13.5 0 -2 0 bump5000.dat
  [1,16,0,0,1.5,13.5,0,0,0,0,13.5,0,-2,0, ldraw_lib__bump5000()],
// 1 16 0 0 1.5 -13.5 0 0 0 0 -13.5 0 -3 0 4-4cyli.dat
  [1,16,0,0,1.5,-13.5,0,0,0,0,-13.5,0,-3,0, ldraw_lib__4_4cyli()],
];
makepoly(ldraw_lib__s__10830s03(), line=0.2);
// file: ../../p/bump5000.scad
use <../lib.scad>
use <4-4con0.scad>
use <4-4con1.scad>
use <4-4con3.scad>
use <4-4edge.scad>
function ldraw_lib__bump5000() = [
// 0 Bump 1.0 x 0.5
// 0 Name: bump5000.dat
// 0 Author: Magnus Forsberg [MagFors]
// 0 !LDRAW_ORG Primitive UPDATE 2010-02
// 0 !LICENSE Licensed under CC BY 2.0 and CC BY 4.0 : see CAreadme.txt
// 
// 0 !HELP This file creates a bump with radius= 1 and height= 0.5 LDU
// 
// 0 BFC CERTIFY CCW
  [0,"BFC","CERTIFY"],
  [0,"BFC","CCW"],
// 
// 0 !HISTORY 2010-07-05 [PTadmin] Official Update 2010-02
// 
// 
// 1 16 0 0 0 0.25 0 0 0 -0.225 0 0 0 -0.25 4-4con3.dat
  [1,16,0,0,0,0.25,0,0,0,-0.225,0,0,0,-0.25, ldraw_lib__4_4con3()],
// 1 16 0 -0.225 0 0.375 0 0 0 -0.225 0 0 0 -0.375 4-4con1.dat
  [1,16,0,-0.225,0,0.375,0,0,0,-0.225,0,0,0,-0.375, ldraw_lib__4_4con1()],
// 1 16 0 -0.45 0 0.375 0 0 0 -0.05 0 0 0 -0.375 4-4con0.dat
  [1,16,0,-0.45,0,0.375,0,0,0,-0.05,0,0,0,-0.375, ldraw_lib__4_4con0()],
// 1 16 0 0 0 1 0 0 0 1 0 0 0 1 4-4edge.dat
  [1,16,0,0,0,1,0,0,0,1,0,0,0,1, ldraw_lib__4_4edge()],
// 5 24 0.692925 -0.225 -0.287025 0.75 -0.225 0 0.9239 0 -0.3827 0.375 -0.45 0
  [5,24,0.692925,-0.225,-0.287025,0.75,-0.225,0,0.9239,0,-0.3827,0.375,-0.45,0],
// 5 24 0.530325 -0.225 -0.530325 0.692925 -0.225 -0.287025 0.7071 0 -0.7071 0.3464625 -0.45 -0.1435125
  [5,24,0.530325,-0.225,-0.530325,0.692925,-0.225,-0.287025,0.7071,0,-0.7071,0.3464625,-0.45,-0.1435125],
// 5 24 0.287025 -0.225 -0.692925 0.530325 -0.225 -0.530325 0.3827 0 -0.9239 0.2651625 -0.45 -0.2651625
  [5,24,0.287025,-0.225,-0.692925,0.530325,-0.225,-0.530325,0.3827,0,-0.9239,0.2651625,-0.45,-0.2651625],
// 5 24 0 -0.225 -0.75 0.287025 -0.225 -0.692925 0 0 -1 0.1435125 -0.45 -0.3464625
  [5,24,0,-0.225,-0.75,0.287025,-0.225,-0.692925,0,0,-1,0.1435125,-0.45,-0.3464625],
// 5 24 -0.287025 -0.225 -0.692925 0 -0.225 -0.75 -0.3827 0 -0.9239 0 -0.45 -0.375
  [5,24,-0.287025,-0.225,-0.692925,0,-0.225,-0.75,-0.3827,0,-0.9239,0,-0.45,-0.375],
// 5 24 -0.530325 -0.225 -0.530325 -0.287025 -0.225 -0.692925 -0.7071 0 -0.7071 -0.1435125 -0.45 -0.3464625
  [5,24,-0.530325,-0.225,-0.530325,-0.287025,-0.225,-0.692925,-0.7071,0,-0.7071,-0.1435125,-0.45,-0.3464625],
// 5 24 -0.692925 -0.225 -0.287025 -0.530325 -0.225 -0.530325 -0.9239 0 -0.3827 -0.2651625 -0.45 -0.2651625
  [5,24,-0.692925,-0.225,-0.287025,-0.530325,-0.225,-0.530325,-0.9239,0,-0.3827,-0.2651625,-0.45,-0.2651625],
// 5 24 -0.75 -0.225 0 -0.692925 -0.225 -0.287025 -1 0 0 -0.3464625 -0.45 -0.1435125
  [5,24,-0.75,-0.225,0,-0.692925,-0.225,-0.287025,-1,0,0,-0.3464625,-0.45,-0.1435125],
// 5 24 -0.692925 -0.225 0.287025 -0.75 -0.225 0 -0.9239 0 0.3827 -0.375 -0.45 0
  [5,24,-0.692925,-0.225,0.287025,-0.75,-0.225,0,-0.9239,0,0.3827,-0.375,-0.45,0],
// 5 24 -0.530325 -0.225 0.530325 -0.692925 -0.225 0.287025 -0.7071 0 0.7071 -0.3464625 -0.45 0.1435125
  [5,24,-0.530325,-0.225,0.530325,-0.692925,-0.225,0.287025,-0.7071,0,0.7071,-0.3464625,-0.45,0.1435125],
// 5 24 -0.287025 -0.225 0.692925 -0.530325 -0.225 0.530325 -0.3827 0 0.9239 -0.2651625 -0.45 0.2651625
  [5,24,-0.287025,-0.225,0.692925,-0.530325,-0.225,0.530325,-0.3827,0,0.9239,-0.2651625,-0.45,0.2651625],
// 5 24 0 -0.225 0.75 -0.287025 -0.225 0.692925 0 0 1 -0.1435125 -0.45 0.3464625
  [5,24,0,-0.225,0.75,-0.287025,-0.225,0.692925,0,0,1,-0.1435125,-0.45,0.3464625],
// 5 24 0.287025 -0.225 0.692925 0 -0.225 0.75 0.3827 0 0.9239 0 -0.45 0.375
  [5,24,0.287025,-0.225,0.692925,0,-0.225,0.75,0.3827,0,0.9239,0,-0.45,0.375],
// 5 24 0.530325 -0.225 0.530325 0.287025 -0.225 0.692925 0.7071 0 0.7071 0.1435125 -0.45 0.3464625
  [5,24,0.530325,-0.225,0.530325,0.287025,-0.225,0.692925,0.7071,0,0.7071,0.1435125,-0.45,0.3464625],
// 5 24 0.692925 -0.225 0.287025 0.530325 -0.225 0.530325 0.9239 0 0.3827 0.2651625 -0.45 0.2651625
  [5,24,0.692925,-0.225,0.287025,0.530325,-0.225,0.530325,0.9239,0,0.3827,0.2651625,-0.45,0.2651625],
// 5 24 0.75 -0.225 0 0.692925 -0.225 0.287025 1 0 0 0.3464625 -0.45 0.1435125
  [5,24,0.75,-0.225,0,0.692925,-0.225,0.287025,1,0,0,0.3464625,-0.45,0.1435125],
// 5 24 0 -0.45 -0.375 -0.1435125 -0.45 -0.3464625 -0.287025 -0.225 -0.692925 0 -0.5 0
  [5,24,0,-0.45,-0.375,-0.1435125,-0.45,-0.3464625,-0.287025,-0.225,-0.692925,0,-0.5,0],
// 5 24 -0.1435125 -0.45 -0.3464625 -0.2651625 -0.45 -0.2651625 -0.530325 -0.225 -0.530325 0 -0.5 0
  [5,24,-0.1435125,-0.45,-0.3464625,-0.2651625,-0.45,-0.2651625,-0.530325,-0.225,-0.530325,0,-0.5,0],
// 5 24 -0.2651625 -0.45 -0.2651625 -0.3464625 -0.45 -0.1435125 -0.692925 -0.225 -0.287025 0 -0.5 0
  [5,24,-0.2651625,-0.45,-0.2651625,-0.3464625,-0.45,-0.1435125,-0.692925,-0.225,-0.287025,0,-0.5,0],
// 5 24 -0.3464625 -0.45 -0.1435125 -0.375 -0.45 0 -0.75 -0.225 0 0 -0.5 0
  [5,24,-0.3464625,-0.45,-0.1435125,-0.375,-0.45,0,-0.75,-0.225,0,0,-0.5,0],
// 5 24 -0.375 -0.45 0 -0.3464625 -0.45 0.1435125 -0.692925 -0.225 0.287025 0 -0.5 0
  [5,24,-0.375,-0.45,0,-0.3464625,-0.45,0.1435125,-0.692925,-0.225,0.287025,0,-0.5,0],
// 5 24 -0.3464625 -0.45 0.1435125 -0.2651625 -0.45 0.2651625 -0.530325 -0.225 0.530325 0 -0.5 0
  [5,24,-0.3464625,-0.45,0.1435125,-0.2651625,-0.45,0.2651625,-0.530325,-0.225,0.530325,0,-0.5,0],
// 5 24 -0.2651625 -0.45 0.2651625 -0.1435125 -0.45 0.3464625 -0.287025 -0.225 0.692925 0 -0.5 0
  [5,24,-0.2651625,-0.45,0.2651625,-0.1435125,-0.45,0.3464625,-0.287025,-0.225,0.692925,0,-0.5,0],
// 5 24 -0.1435125 -0.45 0.3464625 0 -0.45 0.375 0 -0.225 0.75 0 -0.5 0
  [5,24,-0.1435125,-0.45,0.3464625,0,-0.45,0.375,0,-0.225,0.75,0,-0.5,0],
// 5 24 0 -0.45 0.375 0.1435125 -0.45 0.3464625 0.287025 -0.225 0.692925 0 -0.5 0
  [5,24,0,-0.45,0.375,0.1435125,-0.45,0.3464625,0.287025,-0.225,0.692925,0,-0.5,0],
// 5 24 0.1435125 -0.45 0.3464625 0.2651625 -0.45 0.2651625 0.530325 -0.225 0.530325 0 -0.5 0
  [5,24,0.1435125,-0.45,0.3464625,0.2651625,-0.45,0.2651625,0.530325,-0.225,0.530325,0,-0.5,0],
// 5 24 0.2651625 -0.45 0.2651625 0.3464625 -0.45 0.1435125 0.692925 -0.225 0.287025 0 -0.5 0
  [5,24,0.2651625,-0.45,0.2651625,0.3464625,-0.45,0.1435125,0.692925,-0.225,0.287025,0,-0.5,0],
// 5 24 0.3464625 -0.45 0.1435125 0.375 -0.45 0 0.75 -0.225 0 0 -0.5 0
  [5,24,0.3464625,-0.45,0.1435125,0.375,-0.45,0,0.75,-0.225,0,0,-0.5,0],
// 5 24 0.375 -0.45 0 0.3464625 -0.45 -0.1435125 0.692925 -0.225 -0.287025 0 -0.5 0
  [5,24,0.375,-0.45,0,0.3464625,-0.45,-0.1435125,0.692925,-0.225,-0.287025,0,-0.5,0],
// 5 24 0.3464625 -0.45 -0.1435125 0.2651625 -0.45 -0.2651625 0.530325 -0.225 -0.530325 0 -0.5 0
  [5,24,0.3464625,-0.45,-0.1435125,0.2651625,-0.45,-0.2651625,0.530325,-0.225,-0.530325,0,-0.5,0],
// 5 24 0.2651625 -0.45 -0.2651625 0.1435125 -0.45 -0.3464625 0.287025 -0.225 -0.692925 0 -0.5 0
  [5,24,0.2651625,-0.45,-0.2651625,0.1435125,-0.45,-0.3464625,0.287025,-0.225,-0.692925,0,-0.5,0],
// 5 24 0.1435125 -0.45 -0.3464625 0 -0.45 -0.375 0 -0.225 -0.75 0 -0.5 0
  [5,24,0.1435125,-0.45,-0.3464625,0,-0.45,-0.375,0,-0.225,-0.75,0,-0.5,0],
];
makepoly(ldraw_lib__bump5000(), line=0.2);
// main file
use <../../lib.scad>
use <../../p/bump5000.scad>
use <10830s03.scad>
function ldraw_lib__s__10830s01() = [
// 0 ~Lens for Minifig Tool Magnifying Glass with Thick Frame
// 0 Name: s\10830s01.dat
// 0 Author: Gerald Lasser [GeraldLasser]
// 0 !LDRAW_ORG Subpart UPDATE 2020-01
// 0 !LICENSE Licensed under CC BY 2.0 and CC BY 4.0 : see CAreadme.txt
// 
// 0 BFC CERTIFY CCW
  [0,"BFC","CERTIFY"],
  [0,"BFC","CCW"],
// 
// 0 !HISTORY 2020-06-28 [PTadmin] Official Update 2020-01
// 
// 
// 1 16 0 0 0 1 0 0 0 1 0 0 0 1 s\10830s03.dat
  [1,16,0,0,0,1,0,0,0,1,0,0,0,1, ldraw_lib__s__10830s03()],
// 1 16 0 0 -1.5 13.5 0 0 0 0 13.5 0 2 0 bump5000.dat
  [1,16,0,0,-1.5,13.5,0,0,0,0,13.5,0,2,0, ldraw_lib__bump5000()],
];
makepoly(ldraw_lib__s__10830s01(), line=0.2);
